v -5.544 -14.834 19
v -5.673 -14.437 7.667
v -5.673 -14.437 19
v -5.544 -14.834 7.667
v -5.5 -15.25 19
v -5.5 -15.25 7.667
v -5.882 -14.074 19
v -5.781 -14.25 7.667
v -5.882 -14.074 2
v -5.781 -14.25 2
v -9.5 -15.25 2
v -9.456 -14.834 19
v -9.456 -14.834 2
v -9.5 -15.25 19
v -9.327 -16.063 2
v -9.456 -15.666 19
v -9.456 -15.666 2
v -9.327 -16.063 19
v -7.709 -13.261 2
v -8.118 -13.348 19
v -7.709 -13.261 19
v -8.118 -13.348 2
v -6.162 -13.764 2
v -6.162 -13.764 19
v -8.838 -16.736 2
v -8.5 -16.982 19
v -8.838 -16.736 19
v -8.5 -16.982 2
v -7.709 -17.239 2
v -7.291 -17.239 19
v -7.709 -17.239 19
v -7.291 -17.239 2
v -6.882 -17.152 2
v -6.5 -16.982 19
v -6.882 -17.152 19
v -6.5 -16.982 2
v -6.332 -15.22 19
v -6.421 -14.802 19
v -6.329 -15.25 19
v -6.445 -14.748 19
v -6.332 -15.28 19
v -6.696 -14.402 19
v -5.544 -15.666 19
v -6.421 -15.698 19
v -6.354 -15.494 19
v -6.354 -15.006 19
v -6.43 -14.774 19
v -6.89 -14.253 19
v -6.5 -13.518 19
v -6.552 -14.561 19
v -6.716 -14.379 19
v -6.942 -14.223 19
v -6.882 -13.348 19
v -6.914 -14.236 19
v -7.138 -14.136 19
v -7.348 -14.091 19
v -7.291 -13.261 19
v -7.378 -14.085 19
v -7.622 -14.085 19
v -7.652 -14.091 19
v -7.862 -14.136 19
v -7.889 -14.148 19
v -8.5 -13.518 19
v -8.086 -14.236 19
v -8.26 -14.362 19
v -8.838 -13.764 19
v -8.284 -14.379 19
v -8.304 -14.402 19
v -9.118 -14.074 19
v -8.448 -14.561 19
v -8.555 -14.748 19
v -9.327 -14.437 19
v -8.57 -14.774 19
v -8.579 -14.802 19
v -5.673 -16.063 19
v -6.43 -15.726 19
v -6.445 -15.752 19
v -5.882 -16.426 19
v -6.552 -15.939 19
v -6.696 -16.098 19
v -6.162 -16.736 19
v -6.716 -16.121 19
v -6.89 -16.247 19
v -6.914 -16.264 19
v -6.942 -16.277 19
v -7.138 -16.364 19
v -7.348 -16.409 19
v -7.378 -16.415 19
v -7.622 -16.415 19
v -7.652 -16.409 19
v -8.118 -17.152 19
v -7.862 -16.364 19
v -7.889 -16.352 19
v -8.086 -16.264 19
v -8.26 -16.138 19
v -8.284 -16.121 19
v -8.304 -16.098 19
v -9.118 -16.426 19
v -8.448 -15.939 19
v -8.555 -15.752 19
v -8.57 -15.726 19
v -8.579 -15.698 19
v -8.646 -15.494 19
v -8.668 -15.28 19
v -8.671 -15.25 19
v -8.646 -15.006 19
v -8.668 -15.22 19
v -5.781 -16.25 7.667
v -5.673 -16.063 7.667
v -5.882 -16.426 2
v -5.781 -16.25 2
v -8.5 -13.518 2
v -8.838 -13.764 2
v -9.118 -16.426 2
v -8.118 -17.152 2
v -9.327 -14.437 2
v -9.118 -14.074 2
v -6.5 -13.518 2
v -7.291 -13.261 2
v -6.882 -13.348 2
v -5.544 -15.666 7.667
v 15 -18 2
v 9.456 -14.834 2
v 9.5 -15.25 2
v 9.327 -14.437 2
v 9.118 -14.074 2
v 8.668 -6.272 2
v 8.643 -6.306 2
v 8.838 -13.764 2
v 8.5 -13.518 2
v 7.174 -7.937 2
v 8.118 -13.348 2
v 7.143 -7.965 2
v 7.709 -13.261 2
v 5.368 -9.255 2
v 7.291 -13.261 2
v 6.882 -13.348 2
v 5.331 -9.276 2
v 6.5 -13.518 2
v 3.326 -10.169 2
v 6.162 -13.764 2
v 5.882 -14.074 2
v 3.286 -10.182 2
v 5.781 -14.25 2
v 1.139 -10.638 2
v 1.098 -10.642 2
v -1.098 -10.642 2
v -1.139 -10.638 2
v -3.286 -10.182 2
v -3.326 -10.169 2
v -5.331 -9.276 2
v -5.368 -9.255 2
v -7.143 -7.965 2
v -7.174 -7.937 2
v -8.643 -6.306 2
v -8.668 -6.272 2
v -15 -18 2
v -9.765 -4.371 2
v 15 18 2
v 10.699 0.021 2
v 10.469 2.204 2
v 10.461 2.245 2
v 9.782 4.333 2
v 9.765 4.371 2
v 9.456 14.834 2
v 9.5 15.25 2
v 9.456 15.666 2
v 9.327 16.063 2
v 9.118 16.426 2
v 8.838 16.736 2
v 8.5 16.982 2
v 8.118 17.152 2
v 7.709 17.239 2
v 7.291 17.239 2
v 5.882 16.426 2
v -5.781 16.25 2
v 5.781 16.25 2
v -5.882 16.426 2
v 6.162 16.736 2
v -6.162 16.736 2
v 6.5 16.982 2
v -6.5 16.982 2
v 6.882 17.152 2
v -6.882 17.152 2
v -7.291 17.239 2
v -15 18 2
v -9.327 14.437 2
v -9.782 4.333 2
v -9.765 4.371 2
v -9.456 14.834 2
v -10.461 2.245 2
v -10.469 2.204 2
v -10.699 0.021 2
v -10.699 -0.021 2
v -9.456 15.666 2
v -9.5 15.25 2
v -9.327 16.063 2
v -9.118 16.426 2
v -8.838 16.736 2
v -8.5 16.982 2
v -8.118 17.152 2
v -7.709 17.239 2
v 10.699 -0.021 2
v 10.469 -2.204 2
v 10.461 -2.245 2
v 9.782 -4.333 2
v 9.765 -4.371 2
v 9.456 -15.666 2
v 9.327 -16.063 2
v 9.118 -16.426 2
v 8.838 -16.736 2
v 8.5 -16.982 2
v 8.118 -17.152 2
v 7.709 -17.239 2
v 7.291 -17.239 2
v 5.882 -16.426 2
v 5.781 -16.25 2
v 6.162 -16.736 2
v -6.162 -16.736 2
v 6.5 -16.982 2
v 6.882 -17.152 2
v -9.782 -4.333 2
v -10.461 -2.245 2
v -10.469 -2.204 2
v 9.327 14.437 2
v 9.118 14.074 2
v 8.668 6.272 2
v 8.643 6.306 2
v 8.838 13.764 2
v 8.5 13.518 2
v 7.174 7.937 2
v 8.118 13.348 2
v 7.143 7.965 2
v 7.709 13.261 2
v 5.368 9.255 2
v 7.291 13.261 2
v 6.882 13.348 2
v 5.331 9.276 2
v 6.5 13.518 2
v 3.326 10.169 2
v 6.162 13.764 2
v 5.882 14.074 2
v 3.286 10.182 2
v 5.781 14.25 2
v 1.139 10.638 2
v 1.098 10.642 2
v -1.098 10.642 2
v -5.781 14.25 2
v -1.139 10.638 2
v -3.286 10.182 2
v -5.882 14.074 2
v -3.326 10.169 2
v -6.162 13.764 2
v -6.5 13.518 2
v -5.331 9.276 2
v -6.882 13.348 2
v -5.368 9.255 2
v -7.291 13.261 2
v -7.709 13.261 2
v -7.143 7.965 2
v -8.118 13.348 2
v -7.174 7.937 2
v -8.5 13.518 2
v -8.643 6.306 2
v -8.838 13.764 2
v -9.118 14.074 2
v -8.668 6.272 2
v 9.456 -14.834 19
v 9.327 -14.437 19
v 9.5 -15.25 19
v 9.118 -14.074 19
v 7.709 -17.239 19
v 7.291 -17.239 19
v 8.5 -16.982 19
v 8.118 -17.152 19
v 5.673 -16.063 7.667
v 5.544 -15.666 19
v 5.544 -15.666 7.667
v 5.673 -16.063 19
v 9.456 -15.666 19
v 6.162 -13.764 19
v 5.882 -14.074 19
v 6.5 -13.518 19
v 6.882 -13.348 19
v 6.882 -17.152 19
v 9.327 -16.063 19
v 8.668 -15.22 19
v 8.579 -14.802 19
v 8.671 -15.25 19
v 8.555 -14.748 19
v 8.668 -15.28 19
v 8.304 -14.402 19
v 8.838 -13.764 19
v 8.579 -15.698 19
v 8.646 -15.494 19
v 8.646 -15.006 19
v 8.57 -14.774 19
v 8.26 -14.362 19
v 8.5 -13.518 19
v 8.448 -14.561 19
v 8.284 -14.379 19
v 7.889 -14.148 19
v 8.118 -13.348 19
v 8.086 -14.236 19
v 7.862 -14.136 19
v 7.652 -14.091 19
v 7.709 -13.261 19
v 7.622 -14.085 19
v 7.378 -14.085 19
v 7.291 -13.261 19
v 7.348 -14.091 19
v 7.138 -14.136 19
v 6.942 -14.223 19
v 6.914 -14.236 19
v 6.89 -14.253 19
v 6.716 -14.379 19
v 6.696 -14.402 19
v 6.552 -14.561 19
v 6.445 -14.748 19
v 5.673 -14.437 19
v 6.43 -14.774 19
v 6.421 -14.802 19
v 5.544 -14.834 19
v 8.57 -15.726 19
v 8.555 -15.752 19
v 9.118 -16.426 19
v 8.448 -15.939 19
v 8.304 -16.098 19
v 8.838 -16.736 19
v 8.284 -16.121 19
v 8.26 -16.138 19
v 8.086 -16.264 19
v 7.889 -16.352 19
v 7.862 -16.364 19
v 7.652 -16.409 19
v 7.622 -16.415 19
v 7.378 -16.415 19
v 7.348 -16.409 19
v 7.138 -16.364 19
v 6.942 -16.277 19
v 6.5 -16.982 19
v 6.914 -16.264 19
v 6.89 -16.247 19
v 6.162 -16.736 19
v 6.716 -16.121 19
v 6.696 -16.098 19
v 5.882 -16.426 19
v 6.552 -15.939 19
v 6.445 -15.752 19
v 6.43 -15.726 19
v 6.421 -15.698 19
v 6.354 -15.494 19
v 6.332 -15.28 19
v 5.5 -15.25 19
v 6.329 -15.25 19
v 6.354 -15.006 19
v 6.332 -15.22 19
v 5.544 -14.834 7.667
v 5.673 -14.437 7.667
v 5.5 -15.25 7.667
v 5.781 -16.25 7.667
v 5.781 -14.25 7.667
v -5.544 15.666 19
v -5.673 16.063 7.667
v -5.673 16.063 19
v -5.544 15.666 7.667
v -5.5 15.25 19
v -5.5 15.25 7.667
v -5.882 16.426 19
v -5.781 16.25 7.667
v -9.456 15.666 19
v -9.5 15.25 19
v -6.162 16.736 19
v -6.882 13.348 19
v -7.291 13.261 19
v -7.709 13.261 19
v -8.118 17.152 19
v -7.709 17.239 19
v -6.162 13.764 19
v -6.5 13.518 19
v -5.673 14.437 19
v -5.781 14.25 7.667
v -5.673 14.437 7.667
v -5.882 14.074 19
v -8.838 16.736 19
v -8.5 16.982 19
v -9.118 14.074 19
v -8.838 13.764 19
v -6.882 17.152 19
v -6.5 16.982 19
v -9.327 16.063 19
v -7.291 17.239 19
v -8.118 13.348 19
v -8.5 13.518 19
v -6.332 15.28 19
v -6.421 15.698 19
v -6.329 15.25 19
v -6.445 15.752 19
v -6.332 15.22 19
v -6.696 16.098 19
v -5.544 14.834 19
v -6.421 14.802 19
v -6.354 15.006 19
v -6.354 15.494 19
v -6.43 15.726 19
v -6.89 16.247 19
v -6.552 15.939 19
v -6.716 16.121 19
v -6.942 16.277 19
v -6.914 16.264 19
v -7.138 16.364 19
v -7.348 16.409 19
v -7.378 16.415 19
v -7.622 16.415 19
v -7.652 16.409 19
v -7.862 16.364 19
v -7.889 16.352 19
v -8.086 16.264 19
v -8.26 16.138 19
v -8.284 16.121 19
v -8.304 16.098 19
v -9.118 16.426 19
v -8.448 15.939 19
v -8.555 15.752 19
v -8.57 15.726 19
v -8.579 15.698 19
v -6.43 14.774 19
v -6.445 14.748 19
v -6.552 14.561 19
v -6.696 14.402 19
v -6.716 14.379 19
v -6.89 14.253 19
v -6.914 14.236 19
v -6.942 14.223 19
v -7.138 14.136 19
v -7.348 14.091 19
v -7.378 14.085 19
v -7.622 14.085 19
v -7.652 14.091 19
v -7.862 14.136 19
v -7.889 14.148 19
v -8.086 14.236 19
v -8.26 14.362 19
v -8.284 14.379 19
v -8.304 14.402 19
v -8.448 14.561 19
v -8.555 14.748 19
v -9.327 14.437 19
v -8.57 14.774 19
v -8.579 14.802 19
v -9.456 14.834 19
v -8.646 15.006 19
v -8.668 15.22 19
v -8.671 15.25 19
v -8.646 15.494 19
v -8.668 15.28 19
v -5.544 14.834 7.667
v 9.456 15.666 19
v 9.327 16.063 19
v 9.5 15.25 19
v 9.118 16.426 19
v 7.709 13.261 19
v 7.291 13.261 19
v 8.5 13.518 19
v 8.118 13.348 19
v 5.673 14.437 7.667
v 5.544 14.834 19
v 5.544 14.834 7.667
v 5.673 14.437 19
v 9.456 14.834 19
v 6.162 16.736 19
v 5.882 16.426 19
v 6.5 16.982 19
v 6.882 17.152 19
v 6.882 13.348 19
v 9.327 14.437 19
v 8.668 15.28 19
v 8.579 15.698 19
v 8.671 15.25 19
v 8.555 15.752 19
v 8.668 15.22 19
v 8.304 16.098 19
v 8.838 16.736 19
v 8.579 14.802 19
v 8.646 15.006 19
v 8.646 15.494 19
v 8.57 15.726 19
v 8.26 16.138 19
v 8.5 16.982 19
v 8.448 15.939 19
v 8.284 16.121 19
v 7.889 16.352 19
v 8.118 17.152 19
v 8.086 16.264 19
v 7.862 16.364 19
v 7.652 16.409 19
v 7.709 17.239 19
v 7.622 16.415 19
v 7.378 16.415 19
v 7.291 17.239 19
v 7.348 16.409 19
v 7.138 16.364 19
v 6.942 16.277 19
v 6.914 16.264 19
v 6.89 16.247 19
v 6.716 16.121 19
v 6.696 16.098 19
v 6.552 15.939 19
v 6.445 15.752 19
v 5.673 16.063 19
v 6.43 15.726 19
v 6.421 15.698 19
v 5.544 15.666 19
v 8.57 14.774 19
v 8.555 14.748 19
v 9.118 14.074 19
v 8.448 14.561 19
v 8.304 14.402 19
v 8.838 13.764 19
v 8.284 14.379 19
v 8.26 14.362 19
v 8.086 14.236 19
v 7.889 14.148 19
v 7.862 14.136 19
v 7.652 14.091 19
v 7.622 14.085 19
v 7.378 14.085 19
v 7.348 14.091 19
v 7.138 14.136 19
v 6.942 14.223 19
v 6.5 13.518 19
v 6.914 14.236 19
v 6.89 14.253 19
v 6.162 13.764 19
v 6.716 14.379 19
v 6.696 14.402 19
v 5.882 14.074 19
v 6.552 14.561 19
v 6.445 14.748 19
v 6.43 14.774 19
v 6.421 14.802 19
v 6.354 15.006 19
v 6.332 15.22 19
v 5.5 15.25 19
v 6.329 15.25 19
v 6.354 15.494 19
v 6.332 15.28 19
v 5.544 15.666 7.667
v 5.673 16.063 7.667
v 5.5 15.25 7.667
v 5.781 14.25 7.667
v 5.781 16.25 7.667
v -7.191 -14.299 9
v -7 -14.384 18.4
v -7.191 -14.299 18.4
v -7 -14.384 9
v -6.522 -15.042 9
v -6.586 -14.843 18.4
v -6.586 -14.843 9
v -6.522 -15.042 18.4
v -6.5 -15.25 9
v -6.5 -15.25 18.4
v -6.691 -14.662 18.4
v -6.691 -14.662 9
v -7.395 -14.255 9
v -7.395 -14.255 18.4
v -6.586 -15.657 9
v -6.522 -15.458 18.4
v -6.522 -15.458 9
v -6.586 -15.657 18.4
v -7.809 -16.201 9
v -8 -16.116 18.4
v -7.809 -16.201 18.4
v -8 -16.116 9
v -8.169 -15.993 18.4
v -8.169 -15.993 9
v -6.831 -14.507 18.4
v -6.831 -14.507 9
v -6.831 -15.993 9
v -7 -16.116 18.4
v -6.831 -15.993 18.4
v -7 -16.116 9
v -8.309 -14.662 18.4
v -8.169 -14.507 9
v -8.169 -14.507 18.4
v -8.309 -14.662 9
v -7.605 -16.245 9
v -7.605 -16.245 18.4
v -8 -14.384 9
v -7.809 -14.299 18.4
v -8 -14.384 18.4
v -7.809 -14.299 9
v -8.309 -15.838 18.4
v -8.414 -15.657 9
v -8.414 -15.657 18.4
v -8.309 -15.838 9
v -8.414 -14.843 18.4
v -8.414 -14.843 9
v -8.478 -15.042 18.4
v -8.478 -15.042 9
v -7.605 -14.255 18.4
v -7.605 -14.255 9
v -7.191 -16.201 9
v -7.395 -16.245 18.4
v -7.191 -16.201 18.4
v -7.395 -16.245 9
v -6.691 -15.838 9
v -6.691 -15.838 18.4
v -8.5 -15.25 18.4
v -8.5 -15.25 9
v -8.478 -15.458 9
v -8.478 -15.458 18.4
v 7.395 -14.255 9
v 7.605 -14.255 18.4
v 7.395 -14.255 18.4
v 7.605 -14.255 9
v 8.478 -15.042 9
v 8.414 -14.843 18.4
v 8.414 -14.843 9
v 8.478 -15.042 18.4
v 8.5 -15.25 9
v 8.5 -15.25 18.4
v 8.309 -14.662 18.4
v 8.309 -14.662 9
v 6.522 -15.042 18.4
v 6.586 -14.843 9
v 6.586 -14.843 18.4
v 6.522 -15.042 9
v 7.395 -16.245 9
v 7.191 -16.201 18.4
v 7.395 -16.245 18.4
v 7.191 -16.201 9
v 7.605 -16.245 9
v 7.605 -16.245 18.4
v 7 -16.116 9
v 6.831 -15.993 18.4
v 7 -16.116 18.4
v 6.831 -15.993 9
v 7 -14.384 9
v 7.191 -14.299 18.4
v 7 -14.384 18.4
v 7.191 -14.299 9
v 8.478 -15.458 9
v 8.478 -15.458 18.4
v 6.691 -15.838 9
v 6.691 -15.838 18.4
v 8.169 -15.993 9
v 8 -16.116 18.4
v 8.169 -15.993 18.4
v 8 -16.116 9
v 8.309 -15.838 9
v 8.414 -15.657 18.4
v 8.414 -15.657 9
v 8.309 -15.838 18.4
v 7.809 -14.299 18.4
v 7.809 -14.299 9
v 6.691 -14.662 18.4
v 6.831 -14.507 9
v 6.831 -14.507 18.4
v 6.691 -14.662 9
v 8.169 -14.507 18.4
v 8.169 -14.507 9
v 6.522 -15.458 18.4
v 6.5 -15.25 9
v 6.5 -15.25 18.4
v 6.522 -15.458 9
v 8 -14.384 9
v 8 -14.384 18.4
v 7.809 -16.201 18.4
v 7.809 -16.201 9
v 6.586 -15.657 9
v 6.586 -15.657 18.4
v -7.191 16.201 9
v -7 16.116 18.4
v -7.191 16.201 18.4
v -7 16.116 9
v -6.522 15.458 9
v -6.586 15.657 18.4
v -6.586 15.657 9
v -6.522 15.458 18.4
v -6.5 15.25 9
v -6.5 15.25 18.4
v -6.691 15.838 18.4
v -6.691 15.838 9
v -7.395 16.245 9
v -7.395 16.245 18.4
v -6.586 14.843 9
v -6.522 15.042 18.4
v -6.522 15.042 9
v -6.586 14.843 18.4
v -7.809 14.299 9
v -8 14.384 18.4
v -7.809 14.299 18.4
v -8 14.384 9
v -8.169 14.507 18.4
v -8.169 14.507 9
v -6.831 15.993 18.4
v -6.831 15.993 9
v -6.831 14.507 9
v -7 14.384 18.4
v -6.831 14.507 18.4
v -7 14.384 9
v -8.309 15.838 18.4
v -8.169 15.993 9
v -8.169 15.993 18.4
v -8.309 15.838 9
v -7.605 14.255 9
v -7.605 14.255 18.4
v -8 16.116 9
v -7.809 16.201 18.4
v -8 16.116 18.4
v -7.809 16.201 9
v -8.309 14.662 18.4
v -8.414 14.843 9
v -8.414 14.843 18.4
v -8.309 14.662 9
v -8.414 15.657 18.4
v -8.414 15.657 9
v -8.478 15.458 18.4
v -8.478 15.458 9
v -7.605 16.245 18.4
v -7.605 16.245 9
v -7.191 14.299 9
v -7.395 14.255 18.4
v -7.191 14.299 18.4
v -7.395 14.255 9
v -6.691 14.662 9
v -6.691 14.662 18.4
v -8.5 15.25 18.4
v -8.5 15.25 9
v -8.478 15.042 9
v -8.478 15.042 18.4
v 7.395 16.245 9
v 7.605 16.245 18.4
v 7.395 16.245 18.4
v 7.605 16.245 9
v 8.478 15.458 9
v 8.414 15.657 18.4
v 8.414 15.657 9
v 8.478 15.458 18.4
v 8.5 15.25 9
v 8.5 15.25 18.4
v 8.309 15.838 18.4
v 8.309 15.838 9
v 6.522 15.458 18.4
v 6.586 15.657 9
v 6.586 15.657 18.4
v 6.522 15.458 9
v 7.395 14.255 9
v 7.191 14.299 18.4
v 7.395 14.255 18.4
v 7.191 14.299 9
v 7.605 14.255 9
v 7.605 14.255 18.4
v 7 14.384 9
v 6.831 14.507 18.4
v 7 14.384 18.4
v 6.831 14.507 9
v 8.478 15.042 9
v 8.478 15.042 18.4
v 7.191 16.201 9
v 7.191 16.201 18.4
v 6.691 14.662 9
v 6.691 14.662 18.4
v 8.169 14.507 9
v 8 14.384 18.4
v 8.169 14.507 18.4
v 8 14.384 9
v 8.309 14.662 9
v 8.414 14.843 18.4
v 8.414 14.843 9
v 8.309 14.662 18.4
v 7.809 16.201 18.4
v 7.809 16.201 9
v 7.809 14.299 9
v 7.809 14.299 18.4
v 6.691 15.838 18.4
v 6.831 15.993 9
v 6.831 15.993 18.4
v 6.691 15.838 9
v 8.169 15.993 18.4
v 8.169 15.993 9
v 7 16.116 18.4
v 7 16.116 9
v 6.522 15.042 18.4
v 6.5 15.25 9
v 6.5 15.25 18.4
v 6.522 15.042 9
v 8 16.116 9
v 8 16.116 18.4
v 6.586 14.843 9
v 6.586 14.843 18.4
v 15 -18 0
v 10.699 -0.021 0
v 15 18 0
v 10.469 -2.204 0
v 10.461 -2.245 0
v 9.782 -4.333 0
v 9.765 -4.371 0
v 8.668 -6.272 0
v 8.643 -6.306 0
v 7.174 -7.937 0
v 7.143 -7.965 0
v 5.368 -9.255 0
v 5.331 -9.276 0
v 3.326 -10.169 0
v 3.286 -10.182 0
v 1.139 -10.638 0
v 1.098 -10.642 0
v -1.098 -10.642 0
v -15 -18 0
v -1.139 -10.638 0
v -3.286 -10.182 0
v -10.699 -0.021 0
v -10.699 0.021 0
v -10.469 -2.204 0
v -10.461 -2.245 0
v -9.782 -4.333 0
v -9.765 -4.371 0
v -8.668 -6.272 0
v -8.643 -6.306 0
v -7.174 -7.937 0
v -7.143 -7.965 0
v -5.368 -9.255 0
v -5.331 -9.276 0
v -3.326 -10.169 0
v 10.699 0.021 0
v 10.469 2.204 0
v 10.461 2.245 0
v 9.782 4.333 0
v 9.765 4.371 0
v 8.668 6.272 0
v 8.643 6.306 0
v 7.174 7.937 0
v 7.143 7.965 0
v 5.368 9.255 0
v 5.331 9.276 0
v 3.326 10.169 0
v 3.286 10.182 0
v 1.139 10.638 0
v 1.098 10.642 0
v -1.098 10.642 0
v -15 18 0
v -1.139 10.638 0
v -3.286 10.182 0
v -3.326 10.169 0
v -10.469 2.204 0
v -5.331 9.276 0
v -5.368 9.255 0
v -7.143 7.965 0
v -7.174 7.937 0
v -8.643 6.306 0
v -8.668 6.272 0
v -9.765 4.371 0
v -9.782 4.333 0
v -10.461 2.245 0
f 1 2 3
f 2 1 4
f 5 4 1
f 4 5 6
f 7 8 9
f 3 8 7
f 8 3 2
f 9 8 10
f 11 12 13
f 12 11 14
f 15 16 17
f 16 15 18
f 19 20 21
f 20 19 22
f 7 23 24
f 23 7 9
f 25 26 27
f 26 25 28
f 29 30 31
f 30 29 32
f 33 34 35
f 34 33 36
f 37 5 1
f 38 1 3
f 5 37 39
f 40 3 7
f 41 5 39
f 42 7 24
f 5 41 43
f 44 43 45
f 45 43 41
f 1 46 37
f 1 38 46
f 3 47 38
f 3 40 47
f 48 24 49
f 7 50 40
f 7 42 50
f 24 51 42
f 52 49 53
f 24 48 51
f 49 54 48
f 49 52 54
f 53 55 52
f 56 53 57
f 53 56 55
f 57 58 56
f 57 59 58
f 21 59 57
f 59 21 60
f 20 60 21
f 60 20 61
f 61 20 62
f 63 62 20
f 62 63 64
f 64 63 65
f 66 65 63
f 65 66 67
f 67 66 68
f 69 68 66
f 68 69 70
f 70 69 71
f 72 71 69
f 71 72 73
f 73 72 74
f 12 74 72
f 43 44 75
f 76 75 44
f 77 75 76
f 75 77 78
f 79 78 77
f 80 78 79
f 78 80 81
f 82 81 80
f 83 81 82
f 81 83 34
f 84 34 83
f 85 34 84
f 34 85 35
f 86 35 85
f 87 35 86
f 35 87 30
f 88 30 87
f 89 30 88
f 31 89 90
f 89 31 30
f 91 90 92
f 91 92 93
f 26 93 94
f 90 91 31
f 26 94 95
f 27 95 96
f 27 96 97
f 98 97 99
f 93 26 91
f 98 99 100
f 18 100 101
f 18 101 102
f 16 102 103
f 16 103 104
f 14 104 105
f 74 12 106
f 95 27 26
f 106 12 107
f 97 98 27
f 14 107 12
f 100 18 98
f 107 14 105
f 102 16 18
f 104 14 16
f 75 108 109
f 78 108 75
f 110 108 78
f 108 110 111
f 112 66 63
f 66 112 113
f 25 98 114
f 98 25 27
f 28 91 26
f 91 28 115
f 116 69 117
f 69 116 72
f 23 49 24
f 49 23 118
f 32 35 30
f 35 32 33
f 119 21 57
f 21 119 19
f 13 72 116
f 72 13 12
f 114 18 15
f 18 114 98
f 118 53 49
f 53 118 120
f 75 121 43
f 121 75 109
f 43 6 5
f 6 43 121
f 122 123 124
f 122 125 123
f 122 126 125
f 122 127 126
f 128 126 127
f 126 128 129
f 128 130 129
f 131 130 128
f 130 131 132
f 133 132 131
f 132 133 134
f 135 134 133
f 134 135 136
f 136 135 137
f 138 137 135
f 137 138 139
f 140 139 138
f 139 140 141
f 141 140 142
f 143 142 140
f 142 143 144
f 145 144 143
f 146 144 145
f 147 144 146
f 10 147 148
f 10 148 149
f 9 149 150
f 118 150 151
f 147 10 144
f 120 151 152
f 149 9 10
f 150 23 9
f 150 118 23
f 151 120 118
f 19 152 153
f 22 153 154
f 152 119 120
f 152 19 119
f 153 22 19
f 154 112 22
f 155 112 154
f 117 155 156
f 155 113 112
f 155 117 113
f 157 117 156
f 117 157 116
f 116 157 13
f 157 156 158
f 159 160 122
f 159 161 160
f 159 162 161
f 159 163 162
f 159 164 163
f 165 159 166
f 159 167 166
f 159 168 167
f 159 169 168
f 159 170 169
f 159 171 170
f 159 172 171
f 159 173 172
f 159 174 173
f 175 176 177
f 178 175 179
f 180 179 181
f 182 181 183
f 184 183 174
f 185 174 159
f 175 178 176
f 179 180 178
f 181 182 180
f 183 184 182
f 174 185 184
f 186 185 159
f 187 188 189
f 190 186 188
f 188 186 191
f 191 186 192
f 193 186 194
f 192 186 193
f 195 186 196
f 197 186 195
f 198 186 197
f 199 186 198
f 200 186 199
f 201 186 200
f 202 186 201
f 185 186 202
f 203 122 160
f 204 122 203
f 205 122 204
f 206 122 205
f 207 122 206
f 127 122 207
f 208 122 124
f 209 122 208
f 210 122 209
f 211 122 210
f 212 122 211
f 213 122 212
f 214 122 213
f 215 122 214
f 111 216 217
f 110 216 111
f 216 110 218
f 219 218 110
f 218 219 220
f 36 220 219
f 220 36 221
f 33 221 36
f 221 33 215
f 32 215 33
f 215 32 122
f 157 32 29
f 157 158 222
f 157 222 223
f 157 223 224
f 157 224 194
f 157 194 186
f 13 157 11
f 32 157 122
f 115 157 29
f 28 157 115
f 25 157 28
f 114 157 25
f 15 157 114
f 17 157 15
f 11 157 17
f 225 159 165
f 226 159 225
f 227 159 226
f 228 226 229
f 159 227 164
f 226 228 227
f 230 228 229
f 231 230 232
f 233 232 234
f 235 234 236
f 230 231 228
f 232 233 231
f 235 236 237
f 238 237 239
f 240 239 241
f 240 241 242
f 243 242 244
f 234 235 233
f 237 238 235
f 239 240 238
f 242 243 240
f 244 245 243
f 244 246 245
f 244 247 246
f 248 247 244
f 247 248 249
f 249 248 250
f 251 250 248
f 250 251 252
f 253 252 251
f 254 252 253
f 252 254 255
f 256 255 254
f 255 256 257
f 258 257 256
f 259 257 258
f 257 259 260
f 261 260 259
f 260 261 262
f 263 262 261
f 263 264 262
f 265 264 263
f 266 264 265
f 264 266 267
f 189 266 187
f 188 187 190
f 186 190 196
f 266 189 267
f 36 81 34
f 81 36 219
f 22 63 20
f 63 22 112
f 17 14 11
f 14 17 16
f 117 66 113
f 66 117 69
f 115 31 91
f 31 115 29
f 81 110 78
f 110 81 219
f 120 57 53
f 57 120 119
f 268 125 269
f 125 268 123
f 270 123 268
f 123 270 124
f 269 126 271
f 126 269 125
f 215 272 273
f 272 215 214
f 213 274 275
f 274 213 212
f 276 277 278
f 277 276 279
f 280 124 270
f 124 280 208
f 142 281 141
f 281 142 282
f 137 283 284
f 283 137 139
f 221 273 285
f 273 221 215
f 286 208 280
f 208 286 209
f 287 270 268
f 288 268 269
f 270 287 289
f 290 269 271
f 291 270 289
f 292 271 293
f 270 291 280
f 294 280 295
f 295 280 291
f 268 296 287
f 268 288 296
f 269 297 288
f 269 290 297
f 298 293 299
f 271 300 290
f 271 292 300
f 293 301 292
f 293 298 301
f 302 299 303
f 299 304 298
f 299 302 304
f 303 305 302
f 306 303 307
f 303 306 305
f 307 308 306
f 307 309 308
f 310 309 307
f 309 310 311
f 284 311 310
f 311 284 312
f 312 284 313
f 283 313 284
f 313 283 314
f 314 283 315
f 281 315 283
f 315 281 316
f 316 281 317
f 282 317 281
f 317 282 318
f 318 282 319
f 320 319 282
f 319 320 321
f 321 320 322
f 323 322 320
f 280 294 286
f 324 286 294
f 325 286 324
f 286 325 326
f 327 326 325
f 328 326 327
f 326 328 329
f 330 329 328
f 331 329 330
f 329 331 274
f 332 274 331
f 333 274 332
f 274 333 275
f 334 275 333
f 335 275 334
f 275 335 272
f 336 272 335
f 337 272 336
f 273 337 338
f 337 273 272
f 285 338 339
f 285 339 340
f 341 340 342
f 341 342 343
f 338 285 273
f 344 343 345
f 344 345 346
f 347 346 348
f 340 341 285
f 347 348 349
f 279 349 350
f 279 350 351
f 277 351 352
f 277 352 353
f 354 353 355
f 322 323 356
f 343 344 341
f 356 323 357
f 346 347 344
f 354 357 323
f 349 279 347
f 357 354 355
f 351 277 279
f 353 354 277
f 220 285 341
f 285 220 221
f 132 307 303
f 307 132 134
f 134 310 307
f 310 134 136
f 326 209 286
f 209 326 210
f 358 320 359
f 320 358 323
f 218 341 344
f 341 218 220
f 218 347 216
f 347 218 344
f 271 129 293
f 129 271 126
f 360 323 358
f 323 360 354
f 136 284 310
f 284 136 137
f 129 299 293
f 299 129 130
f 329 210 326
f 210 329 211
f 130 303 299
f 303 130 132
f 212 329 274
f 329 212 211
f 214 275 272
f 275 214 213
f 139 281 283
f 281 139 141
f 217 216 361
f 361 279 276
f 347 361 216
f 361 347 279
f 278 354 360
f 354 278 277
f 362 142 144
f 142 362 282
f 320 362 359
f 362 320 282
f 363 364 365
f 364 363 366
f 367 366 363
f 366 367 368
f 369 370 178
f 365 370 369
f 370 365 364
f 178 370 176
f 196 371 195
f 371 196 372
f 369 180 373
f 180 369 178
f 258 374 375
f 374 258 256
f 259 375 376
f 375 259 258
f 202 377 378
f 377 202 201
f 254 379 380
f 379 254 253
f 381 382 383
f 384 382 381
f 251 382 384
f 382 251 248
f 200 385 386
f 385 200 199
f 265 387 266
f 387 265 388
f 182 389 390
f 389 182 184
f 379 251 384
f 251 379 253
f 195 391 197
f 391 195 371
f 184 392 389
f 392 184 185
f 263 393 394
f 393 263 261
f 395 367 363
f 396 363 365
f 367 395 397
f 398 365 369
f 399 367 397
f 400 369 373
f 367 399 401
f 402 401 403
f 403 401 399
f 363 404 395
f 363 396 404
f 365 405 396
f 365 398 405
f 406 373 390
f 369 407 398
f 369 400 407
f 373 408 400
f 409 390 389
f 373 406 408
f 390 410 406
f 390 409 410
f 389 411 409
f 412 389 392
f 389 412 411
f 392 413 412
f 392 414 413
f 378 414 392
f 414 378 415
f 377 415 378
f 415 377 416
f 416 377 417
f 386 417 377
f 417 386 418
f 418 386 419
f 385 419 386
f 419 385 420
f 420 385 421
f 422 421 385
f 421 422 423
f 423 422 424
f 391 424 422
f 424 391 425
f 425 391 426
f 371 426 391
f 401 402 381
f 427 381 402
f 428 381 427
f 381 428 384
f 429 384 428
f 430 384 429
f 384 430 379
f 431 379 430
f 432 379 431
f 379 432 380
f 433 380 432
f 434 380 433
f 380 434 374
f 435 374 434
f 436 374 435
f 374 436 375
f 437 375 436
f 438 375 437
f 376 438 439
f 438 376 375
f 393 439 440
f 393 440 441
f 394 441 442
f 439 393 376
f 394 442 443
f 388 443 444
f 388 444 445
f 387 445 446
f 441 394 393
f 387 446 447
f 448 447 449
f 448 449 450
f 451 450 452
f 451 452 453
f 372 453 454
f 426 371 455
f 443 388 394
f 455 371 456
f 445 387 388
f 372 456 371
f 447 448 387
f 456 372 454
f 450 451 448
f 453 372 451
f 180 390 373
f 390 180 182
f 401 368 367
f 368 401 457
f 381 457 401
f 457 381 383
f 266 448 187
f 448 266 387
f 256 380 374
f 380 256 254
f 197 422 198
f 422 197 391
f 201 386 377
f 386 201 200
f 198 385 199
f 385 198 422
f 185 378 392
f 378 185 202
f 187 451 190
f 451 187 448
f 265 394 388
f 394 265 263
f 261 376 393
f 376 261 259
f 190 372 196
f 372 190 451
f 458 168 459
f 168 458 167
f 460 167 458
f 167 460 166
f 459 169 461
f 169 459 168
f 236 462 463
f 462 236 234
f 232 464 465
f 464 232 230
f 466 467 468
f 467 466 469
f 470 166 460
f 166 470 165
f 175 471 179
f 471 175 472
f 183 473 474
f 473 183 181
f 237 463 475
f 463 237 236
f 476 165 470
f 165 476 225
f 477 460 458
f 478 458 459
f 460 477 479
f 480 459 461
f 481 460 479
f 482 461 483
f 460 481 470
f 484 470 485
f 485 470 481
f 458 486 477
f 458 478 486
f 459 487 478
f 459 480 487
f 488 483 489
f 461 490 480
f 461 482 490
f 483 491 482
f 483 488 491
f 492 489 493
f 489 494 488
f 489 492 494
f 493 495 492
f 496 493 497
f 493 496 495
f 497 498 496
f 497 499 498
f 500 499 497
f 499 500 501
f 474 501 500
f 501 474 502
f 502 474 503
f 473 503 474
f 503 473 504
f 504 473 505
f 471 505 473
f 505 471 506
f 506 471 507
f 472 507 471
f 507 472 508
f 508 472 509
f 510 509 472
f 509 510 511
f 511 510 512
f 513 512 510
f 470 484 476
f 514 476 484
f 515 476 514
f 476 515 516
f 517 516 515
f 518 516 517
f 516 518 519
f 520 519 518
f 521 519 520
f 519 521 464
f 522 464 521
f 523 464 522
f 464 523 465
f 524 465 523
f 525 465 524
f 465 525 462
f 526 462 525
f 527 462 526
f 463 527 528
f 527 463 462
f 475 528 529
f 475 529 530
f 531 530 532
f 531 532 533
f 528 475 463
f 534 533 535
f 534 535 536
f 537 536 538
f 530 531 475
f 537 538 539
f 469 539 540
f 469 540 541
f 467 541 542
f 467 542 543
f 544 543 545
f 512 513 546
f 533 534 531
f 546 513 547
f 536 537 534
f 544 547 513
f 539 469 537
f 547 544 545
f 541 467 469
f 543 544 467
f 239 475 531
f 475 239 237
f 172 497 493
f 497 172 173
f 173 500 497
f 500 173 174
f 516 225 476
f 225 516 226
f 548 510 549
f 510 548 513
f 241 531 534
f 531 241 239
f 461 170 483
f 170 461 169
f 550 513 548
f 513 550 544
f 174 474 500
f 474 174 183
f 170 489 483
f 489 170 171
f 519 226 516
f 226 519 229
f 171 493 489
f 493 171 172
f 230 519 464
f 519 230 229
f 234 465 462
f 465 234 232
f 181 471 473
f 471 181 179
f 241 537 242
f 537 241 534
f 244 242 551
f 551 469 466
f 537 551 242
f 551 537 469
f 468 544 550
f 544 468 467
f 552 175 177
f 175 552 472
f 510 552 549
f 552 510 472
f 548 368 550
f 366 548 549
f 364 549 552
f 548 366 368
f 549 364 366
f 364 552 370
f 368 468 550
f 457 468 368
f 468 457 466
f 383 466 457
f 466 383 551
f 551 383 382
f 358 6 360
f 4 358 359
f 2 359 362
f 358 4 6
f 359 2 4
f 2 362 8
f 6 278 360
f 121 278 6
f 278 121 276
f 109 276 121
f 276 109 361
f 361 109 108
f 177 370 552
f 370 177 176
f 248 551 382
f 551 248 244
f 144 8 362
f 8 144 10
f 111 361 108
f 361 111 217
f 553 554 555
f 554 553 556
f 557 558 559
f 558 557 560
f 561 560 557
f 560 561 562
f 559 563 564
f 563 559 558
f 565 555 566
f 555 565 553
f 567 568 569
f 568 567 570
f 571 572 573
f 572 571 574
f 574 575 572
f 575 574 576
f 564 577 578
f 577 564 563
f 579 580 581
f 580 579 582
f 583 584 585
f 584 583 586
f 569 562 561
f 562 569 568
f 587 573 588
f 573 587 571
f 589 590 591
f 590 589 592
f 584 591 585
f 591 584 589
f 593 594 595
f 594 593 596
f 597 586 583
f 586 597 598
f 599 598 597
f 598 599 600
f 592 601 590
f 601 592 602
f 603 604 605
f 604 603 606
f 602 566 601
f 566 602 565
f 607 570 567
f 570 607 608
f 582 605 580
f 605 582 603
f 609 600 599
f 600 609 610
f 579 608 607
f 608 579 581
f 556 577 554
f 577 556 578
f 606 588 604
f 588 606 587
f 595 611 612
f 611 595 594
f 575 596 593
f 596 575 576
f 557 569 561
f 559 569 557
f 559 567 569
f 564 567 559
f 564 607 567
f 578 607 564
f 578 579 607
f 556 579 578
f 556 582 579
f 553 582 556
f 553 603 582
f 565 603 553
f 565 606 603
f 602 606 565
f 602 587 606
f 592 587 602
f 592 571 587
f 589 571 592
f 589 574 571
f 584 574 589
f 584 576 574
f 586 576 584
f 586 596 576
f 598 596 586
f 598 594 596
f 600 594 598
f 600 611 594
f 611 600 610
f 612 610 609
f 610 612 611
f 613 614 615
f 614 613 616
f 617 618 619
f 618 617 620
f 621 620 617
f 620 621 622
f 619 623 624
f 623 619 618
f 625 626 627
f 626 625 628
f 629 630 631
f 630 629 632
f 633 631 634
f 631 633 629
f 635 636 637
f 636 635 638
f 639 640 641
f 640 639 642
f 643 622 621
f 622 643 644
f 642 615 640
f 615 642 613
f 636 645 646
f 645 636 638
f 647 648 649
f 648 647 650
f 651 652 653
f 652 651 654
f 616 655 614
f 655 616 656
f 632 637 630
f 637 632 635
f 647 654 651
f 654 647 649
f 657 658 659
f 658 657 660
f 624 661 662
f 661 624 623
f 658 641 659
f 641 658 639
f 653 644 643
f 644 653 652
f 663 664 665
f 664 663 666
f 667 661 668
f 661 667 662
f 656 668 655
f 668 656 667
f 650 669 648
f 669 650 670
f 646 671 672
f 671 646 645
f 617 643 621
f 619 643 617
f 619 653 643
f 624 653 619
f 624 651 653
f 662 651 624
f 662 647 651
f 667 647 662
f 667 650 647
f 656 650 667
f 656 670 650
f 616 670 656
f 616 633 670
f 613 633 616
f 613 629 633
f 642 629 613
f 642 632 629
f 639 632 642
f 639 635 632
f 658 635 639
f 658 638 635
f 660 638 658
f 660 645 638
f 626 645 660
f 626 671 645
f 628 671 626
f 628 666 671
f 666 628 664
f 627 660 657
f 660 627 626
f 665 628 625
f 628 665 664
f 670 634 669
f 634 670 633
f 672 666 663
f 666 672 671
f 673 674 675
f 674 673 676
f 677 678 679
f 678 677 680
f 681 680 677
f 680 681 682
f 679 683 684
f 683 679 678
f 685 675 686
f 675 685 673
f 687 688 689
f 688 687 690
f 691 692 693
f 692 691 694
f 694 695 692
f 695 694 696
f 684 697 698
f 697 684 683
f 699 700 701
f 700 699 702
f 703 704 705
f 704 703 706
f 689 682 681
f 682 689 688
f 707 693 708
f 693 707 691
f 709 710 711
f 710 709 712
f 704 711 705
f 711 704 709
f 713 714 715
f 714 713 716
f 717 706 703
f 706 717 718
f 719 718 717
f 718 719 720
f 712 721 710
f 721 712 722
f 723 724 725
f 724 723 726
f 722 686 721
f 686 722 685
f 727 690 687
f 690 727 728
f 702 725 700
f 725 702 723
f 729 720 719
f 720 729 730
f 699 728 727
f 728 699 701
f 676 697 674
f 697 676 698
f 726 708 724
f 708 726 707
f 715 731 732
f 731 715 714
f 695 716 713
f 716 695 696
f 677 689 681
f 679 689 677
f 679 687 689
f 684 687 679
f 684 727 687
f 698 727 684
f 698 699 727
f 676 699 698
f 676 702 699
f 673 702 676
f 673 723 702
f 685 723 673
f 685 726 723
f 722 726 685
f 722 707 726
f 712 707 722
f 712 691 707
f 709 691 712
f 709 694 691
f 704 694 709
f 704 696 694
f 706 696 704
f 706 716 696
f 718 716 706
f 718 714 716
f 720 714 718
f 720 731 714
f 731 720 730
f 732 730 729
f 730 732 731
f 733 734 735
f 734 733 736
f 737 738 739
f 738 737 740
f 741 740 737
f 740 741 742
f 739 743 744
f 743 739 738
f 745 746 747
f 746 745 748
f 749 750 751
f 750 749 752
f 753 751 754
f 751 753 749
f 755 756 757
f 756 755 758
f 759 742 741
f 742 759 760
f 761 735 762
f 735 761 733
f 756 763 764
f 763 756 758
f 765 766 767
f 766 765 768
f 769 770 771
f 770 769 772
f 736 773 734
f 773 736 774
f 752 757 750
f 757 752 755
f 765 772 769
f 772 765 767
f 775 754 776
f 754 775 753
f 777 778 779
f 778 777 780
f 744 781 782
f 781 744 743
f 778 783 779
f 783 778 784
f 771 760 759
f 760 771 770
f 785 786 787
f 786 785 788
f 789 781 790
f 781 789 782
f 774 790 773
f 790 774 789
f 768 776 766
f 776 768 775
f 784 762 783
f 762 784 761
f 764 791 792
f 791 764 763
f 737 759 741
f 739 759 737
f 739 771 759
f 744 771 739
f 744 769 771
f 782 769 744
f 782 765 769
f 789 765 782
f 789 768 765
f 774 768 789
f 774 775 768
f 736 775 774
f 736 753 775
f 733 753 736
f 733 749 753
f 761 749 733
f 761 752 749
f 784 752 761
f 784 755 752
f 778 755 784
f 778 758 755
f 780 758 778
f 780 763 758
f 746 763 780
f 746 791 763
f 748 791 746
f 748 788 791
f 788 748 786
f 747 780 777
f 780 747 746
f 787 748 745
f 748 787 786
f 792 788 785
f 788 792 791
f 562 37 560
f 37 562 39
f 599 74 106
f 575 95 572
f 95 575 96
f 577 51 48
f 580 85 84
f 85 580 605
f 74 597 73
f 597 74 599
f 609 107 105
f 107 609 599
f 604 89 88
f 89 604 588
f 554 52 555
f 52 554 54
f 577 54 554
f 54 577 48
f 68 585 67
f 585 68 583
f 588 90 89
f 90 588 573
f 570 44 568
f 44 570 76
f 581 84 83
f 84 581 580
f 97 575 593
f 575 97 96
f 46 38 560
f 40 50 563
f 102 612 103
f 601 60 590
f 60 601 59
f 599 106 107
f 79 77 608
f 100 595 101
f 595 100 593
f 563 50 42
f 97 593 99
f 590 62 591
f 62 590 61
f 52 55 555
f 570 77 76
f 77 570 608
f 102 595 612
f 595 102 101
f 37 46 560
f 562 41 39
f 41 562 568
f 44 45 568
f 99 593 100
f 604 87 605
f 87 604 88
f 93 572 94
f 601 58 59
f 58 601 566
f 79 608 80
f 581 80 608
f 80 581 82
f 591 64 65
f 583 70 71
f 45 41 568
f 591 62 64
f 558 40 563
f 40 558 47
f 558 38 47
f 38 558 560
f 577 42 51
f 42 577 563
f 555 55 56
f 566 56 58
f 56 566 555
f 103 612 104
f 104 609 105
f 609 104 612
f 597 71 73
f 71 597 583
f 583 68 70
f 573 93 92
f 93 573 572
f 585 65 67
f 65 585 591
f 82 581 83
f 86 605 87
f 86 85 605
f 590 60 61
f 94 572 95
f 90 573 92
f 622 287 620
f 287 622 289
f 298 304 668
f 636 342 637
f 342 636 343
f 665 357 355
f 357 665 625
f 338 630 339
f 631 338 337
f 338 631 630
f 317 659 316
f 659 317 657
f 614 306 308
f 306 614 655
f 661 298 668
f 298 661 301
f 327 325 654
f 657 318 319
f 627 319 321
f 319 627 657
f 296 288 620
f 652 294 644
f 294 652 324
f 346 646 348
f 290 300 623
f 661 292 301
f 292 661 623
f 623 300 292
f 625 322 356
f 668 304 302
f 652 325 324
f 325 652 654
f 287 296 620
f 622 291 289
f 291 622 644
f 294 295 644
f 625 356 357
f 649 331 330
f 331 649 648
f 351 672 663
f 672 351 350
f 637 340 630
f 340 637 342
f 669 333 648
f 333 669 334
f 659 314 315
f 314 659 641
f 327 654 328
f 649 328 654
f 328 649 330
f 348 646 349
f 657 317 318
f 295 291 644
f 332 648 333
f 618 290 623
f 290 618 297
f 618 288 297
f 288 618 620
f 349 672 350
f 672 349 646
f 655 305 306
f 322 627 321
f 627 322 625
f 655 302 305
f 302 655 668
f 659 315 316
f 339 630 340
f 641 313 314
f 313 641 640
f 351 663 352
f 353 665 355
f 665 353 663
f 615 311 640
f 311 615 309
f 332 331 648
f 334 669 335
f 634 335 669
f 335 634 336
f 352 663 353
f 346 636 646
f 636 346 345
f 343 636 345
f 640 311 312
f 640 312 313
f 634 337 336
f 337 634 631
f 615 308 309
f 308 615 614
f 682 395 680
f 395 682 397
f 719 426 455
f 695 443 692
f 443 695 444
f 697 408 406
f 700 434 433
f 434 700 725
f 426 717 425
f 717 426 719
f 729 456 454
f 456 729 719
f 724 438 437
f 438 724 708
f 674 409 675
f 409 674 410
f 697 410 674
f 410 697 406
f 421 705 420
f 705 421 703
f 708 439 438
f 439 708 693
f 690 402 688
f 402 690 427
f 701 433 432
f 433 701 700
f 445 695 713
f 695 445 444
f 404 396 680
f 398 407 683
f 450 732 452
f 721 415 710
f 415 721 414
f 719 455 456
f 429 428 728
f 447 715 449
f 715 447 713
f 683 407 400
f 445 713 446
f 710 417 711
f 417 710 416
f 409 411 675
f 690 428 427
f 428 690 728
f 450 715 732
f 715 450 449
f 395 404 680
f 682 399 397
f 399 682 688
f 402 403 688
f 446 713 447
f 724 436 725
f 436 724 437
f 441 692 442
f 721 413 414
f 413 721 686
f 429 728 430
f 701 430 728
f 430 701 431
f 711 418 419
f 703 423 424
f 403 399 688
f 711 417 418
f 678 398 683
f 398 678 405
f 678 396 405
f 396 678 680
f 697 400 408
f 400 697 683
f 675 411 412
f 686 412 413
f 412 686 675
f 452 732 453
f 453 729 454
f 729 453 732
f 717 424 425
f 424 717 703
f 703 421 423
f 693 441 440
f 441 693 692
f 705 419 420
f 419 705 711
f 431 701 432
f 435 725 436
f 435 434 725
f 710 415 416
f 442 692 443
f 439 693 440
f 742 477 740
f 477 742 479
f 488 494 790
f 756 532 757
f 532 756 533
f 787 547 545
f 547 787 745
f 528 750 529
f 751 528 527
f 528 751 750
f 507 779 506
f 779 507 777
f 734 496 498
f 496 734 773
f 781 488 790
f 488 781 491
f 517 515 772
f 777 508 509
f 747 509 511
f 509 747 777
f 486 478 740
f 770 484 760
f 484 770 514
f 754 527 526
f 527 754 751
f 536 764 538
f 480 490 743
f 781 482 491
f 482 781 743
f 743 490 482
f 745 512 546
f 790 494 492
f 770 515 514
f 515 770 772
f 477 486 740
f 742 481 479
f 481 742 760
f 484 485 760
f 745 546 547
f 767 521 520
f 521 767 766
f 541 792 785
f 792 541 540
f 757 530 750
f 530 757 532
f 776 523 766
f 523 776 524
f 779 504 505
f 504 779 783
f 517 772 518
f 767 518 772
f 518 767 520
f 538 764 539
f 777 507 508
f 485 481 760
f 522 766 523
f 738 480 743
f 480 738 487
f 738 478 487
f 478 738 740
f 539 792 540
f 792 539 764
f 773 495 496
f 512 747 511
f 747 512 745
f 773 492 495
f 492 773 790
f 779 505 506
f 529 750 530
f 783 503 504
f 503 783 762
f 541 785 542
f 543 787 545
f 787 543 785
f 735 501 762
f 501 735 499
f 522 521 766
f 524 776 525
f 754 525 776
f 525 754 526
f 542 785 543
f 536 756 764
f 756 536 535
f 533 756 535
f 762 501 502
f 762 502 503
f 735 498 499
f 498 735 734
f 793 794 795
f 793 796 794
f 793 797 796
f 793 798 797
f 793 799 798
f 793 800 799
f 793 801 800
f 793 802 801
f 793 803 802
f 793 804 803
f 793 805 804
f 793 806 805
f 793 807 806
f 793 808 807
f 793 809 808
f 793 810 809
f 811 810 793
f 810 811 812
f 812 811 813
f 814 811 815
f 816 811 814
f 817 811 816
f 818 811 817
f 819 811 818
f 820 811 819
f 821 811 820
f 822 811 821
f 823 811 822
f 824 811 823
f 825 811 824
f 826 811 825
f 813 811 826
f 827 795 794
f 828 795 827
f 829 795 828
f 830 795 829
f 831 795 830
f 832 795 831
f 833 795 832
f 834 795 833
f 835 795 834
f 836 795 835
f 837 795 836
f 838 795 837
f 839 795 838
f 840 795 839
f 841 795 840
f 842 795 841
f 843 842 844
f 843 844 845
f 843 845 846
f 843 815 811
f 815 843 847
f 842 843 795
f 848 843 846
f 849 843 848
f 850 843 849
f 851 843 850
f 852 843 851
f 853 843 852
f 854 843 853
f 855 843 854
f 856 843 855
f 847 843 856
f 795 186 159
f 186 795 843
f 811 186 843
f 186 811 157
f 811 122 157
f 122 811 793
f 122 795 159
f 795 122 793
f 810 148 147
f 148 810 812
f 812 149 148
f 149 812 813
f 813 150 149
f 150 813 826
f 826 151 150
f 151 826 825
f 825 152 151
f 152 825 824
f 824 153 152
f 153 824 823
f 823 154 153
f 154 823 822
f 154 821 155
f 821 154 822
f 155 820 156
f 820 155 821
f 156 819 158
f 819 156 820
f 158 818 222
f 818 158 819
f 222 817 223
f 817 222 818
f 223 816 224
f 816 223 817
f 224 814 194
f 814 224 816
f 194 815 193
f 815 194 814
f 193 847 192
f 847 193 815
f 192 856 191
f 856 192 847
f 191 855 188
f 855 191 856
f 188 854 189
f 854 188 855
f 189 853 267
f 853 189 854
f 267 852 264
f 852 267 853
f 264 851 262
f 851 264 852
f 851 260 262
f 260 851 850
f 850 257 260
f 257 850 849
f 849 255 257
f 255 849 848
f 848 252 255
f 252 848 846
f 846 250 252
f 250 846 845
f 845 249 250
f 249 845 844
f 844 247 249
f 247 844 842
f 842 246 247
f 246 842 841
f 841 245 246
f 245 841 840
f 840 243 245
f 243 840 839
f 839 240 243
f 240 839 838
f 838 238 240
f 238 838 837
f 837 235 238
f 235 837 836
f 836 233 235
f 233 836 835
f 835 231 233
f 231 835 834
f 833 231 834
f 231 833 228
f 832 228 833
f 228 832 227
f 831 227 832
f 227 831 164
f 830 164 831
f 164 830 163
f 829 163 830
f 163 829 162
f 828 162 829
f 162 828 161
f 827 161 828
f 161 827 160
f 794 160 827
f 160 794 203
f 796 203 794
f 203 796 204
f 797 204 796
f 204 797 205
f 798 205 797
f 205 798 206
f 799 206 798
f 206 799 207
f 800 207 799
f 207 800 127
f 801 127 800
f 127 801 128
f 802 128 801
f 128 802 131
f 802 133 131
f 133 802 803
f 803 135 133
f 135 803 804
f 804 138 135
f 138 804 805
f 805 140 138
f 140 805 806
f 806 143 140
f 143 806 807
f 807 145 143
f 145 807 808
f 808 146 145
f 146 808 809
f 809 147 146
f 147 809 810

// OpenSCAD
// Testing dimensions to panel-mount a Parallax brand thumbstick module.

m2_tap_d = 1.6;


module parallax_thumbstick_mount(nozzle_d=0.4) {
    $fs=nozzle_d/2;
    th = 2;
    pilot_d = m2_tap_d;
    pilot_l = 10;
    dx = 15/2;
    dy = 30.5/2;

    module mounts() {
        translate([-dx, -dy]) children();
        translate([ dx, -dy]) children();
        translate([-dx,  dy]) children();
        translate([ dx,  dy]) children();
    }

    module panel() {
        linear_extrude(th) {
            difference() {
                square([30, 36], center=true);
                offset(r=nozzle_d/2) circle(d=21);
            }
        }
    }

    module posts() {
        boss_d = 4;
        boss_h = max(19 - th, 17);
        difference() {
            union() {
                mounts() { cylinder(h=boss_h, d=boss_d); }
                linear_extrude(boss_h/3) {
                    translate([0, -dy]) square([2*dx, 5*nozzle_d], center=true);
                    translate([0,  dy]) square([2*dx, 5*nozzle_d], center=true);
                }
            }
            translate([0, 0, boss_h-pilot_l]) {
                mounts() cylinder(h=pilot_l+0.1, d=pilot_d+nozzle_d);
            }
            translate([0, 0, boss_h-0.6]) {
                mounts() cylinder(h=0.7, d1=pilot_d+nozzle_d, d2=pilot_d+2*nozzle_d);
            }
        }
    }

    panel();
    translate([0, 0, th]) posts();
}

parallax_thumbstick_mount();
